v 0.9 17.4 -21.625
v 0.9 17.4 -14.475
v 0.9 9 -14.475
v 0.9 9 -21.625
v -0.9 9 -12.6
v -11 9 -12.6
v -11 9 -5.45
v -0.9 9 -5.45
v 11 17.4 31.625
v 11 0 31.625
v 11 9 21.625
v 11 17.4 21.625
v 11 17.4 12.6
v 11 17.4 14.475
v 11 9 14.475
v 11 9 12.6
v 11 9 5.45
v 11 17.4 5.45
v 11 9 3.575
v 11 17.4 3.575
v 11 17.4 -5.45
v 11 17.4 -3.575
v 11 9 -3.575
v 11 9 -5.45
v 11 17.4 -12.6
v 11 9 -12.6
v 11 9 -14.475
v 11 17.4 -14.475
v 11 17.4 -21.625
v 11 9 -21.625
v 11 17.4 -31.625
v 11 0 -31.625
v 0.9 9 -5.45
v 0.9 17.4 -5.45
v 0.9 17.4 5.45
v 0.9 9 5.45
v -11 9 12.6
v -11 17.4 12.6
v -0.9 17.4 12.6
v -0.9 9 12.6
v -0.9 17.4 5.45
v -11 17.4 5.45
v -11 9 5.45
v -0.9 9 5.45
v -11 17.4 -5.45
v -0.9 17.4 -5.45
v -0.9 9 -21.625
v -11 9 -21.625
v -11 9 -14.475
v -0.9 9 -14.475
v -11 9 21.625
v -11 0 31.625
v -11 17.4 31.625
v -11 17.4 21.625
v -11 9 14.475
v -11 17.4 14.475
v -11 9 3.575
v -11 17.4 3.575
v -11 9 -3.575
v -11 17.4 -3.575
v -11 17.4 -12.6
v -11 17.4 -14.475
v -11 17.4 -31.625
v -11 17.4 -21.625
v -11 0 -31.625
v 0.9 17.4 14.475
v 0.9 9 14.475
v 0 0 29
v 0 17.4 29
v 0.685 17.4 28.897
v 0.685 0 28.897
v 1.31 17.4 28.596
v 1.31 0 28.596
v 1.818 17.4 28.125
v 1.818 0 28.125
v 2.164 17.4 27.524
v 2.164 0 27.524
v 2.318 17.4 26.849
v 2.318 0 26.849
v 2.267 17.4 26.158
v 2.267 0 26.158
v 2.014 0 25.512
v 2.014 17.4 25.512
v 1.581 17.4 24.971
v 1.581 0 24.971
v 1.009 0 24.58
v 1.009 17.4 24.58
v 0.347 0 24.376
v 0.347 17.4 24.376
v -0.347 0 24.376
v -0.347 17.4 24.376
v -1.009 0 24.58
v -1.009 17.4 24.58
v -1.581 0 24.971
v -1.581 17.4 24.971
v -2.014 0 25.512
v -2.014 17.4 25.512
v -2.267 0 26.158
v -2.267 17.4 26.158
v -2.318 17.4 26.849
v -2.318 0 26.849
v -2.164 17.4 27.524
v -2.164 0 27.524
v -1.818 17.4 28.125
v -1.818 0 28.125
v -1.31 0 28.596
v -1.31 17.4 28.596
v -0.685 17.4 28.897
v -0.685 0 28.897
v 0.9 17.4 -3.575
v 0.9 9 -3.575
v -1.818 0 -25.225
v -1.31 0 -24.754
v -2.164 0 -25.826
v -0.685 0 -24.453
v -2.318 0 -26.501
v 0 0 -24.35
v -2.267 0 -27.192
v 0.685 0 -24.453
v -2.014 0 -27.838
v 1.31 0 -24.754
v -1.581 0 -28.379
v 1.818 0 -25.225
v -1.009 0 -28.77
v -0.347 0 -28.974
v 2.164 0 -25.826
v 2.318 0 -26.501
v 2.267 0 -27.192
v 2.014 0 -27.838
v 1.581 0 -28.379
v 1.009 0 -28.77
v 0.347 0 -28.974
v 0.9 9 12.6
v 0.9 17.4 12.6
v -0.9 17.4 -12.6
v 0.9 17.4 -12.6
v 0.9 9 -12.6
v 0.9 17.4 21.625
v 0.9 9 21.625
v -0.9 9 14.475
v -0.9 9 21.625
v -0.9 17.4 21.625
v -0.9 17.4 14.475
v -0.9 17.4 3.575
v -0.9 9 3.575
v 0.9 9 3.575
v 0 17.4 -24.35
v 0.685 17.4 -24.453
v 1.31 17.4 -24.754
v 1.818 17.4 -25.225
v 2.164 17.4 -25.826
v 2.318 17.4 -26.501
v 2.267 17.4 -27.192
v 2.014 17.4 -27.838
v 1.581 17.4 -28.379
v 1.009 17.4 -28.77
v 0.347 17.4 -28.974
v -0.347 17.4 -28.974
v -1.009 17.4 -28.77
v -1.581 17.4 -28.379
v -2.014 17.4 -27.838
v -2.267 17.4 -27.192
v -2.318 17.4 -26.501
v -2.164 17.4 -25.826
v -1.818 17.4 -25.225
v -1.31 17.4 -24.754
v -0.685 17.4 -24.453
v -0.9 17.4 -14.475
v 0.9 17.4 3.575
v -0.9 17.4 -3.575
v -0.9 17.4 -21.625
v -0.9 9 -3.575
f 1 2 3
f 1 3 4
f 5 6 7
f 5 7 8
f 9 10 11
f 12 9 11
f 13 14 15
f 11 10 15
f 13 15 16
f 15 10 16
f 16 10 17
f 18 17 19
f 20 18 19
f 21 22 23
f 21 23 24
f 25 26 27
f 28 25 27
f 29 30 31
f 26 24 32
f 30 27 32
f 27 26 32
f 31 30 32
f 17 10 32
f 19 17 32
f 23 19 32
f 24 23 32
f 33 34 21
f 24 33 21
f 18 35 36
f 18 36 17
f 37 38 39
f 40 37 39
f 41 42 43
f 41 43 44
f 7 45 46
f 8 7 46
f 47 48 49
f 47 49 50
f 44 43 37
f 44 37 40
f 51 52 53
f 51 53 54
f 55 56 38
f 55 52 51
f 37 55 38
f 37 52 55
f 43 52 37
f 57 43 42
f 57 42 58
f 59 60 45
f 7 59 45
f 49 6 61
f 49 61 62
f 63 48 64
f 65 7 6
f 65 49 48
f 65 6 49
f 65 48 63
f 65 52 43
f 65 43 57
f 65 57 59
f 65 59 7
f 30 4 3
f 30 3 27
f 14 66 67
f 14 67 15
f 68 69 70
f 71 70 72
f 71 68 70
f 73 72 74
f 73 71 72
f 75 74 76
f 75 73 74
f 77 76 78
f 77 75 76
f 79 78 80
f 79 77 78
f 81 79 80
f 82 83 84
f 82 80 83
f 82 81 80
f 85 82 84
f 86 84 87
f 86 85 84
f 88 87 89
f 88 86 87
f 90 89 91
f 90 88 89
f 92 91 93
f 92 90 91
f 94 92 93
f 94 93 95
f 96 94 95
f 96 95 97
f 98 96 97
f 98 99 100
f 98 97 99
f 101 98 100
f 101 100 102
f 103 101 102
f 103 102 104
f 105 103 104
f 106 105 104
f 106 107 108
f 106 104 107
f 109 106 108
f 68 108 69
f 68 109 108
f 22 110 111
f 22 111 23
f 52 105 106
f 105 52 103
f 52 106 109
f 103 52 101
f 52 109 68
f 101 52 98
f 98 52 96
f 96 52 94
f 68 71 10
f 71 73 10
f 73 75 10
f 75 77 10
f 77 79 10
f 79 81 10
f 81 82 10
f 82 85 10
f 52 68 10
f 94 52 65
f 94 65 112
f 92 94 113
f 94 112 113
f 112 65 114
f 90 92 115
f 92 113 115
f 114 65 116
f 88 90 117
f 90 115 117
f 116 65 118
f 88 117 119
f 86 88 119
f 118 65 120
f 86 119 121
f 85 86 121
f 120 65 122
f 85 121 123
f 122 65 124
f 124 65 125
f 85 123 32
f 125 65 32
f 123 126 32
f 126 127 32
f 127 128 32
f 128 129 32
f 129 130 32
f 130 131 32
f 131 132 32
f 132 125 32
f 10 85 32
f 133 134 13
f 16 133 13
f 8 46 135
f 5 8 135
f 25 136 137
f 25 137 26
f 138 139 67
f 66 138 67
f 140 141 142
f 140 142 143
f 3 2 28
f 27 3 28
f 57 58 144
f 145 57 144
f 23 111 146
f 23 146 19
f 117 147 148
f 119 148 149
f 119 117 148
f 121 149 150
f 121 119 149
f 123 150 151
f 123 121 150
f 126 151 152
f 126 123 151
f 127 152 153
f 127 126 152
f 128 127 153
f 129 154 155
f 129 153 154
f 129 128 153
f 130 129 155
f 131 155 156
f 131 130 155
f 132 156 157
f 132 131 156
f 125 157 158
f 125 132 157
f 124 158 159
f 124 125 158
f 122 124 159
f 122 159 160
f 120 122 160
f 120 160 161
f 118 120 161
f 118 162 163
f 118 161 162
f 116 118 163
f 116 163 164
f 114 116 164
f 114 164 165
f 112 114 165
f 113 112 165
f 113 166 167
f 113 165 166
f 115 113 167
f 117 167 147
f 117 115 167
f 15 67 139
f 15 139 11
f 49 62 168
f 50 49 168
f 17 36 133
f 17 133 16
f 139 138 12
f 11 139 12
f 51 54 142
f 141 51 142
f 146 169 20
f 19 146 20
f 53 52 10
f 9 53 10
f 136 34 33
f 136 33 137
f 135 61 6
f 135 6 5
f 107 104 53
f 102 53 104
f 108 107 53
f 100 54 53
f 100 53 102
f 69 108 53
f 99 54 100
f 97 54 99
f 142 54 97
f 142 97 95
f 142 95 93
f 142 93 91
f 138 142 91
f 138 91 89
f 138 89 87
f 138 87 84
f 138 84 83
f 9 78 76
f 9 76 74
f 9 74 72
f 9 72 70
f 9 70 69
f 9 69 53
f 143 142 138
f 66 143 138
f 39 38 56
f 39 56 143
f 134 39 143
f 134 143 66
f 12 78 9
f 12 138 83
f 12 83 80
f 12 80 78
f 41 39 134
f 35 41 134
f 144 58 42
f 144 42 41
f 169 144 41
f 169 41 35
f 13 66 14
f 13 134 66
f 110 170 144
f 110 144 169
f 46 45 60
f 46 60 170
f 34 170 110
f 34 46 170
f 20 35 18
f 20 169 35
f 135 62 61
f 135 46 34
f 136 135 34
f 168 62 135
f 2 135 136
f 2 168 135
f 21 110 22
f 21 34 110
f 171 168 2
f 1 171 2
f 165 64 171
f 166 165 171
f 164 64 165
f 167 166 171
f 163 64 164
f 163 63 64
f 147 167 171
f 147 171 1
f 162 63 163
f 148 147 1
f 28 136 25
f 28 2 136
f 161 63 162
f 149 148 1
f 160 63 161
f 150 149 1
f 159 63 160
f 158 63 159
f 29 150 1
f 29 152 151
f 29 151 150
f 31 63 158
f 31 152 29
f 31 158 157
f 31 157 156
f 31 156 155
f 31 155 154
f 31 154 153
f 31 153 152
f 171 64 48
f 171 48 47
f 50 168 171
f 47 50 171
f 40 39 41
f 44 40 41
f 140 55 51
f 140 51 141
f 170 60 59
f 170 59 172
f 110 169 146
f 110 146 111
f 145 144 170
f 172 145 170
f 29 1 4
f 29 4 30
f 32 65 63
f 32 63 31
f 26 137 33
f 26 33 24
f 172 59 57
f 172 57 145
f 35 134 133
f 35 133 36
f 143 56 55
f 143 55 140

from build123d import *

# Parameters (mm, degrees)
SKETCH1_W           = 22
SKETCH1_H           = 63.25
BOSS_EXTRUDE1_DEPTH = 17.4
SKETCH2_W           = 10.1
SKETCH2_H           = 7.15
CUT_EXTRUDE1_DEPTH  = 8.4
SKETCH3_R           = 2.325
CUT_EXTRUDE2_DEPTH  = 38.734607789


with BuildPart() as part:
    # Sketch1 → Boss-Extrude1 (new body)
    with BuildSketch(Plane(origin=(0, 0, 0), x_dir=(1, 0, 0), z_dir=(0, 1, 0))):
        Rectangle(SKETCH1_W, SKETCH1_H)
    extrude(amount=BOSS_EXTRUDE1_DEPTH)

    # Sketch2 → Cut-Extrude1 (cut)
    with BuildSketch(Plane(origin=(0, 17.4, 0), x_dir=(1, 0, 0), z_dir=(0, 1, 0))):
        with Locations((-5.95, 18.05)):
            Rectangle(SKETCH2_W, SKETCH2_H)
        with Locations((5.95, 18.05)):
            Rectangle(SKETCH2_W, SKETCH2_H)
        with Locations((-5.95, 9.025)):
            Rectangle(SKETCH2_W, SKETCH2_H)
        with Locations((5.95, 9.025)):
            Rectangle(SKETCH2_W, SKETCH2_H)
        with Locations((-5.95, 0)):
            Rectangle(SKETCH2_W, SKETCH2_H)
        with Locations((5.95, 0)):
            Rectangle(SKETCH2_W, SKETCH2_H)
        with Locations((-5.95, -9.025)):
            Rectangle(SKETCH2_W, SKETCH2_H)
        with Locations((5.95, -9.025)):
            Rectangle(SKETCH2_W, SKETCH2_H)
        with Locations((-5.95, -18.05)):
            Rectangle(SKETCH2_W, SKETCH2_H)
        with Locations((5.95, -18.05)):
            Rectangle(SKETCH2_W, SKETCH2_H)
    extrude(amount=-CUT_EXTRUDE1_DEPTH, mode=Mode.SUBTRACT)

    # Sketch3 → Cut-Extrude2 (cut, through all)
    with BuildSketch(Plane(origin=(0, 0, 0), x_dir=(1, 0, 0), z_dir=(0, 1, 0))):
        with Locations(Location((0, 26.675, 0), (0, 0, 270))):
            Circle(SKETCH3_R)
        with Locations(Location((0, -26.675, 0), (0, 0, 270))):
            Circle(SKETCH3_R)
    extrude(amount=CUT_EXTRUDE2_DEPTH, mode=Mode.SUBTRACT)


solid = part.part
